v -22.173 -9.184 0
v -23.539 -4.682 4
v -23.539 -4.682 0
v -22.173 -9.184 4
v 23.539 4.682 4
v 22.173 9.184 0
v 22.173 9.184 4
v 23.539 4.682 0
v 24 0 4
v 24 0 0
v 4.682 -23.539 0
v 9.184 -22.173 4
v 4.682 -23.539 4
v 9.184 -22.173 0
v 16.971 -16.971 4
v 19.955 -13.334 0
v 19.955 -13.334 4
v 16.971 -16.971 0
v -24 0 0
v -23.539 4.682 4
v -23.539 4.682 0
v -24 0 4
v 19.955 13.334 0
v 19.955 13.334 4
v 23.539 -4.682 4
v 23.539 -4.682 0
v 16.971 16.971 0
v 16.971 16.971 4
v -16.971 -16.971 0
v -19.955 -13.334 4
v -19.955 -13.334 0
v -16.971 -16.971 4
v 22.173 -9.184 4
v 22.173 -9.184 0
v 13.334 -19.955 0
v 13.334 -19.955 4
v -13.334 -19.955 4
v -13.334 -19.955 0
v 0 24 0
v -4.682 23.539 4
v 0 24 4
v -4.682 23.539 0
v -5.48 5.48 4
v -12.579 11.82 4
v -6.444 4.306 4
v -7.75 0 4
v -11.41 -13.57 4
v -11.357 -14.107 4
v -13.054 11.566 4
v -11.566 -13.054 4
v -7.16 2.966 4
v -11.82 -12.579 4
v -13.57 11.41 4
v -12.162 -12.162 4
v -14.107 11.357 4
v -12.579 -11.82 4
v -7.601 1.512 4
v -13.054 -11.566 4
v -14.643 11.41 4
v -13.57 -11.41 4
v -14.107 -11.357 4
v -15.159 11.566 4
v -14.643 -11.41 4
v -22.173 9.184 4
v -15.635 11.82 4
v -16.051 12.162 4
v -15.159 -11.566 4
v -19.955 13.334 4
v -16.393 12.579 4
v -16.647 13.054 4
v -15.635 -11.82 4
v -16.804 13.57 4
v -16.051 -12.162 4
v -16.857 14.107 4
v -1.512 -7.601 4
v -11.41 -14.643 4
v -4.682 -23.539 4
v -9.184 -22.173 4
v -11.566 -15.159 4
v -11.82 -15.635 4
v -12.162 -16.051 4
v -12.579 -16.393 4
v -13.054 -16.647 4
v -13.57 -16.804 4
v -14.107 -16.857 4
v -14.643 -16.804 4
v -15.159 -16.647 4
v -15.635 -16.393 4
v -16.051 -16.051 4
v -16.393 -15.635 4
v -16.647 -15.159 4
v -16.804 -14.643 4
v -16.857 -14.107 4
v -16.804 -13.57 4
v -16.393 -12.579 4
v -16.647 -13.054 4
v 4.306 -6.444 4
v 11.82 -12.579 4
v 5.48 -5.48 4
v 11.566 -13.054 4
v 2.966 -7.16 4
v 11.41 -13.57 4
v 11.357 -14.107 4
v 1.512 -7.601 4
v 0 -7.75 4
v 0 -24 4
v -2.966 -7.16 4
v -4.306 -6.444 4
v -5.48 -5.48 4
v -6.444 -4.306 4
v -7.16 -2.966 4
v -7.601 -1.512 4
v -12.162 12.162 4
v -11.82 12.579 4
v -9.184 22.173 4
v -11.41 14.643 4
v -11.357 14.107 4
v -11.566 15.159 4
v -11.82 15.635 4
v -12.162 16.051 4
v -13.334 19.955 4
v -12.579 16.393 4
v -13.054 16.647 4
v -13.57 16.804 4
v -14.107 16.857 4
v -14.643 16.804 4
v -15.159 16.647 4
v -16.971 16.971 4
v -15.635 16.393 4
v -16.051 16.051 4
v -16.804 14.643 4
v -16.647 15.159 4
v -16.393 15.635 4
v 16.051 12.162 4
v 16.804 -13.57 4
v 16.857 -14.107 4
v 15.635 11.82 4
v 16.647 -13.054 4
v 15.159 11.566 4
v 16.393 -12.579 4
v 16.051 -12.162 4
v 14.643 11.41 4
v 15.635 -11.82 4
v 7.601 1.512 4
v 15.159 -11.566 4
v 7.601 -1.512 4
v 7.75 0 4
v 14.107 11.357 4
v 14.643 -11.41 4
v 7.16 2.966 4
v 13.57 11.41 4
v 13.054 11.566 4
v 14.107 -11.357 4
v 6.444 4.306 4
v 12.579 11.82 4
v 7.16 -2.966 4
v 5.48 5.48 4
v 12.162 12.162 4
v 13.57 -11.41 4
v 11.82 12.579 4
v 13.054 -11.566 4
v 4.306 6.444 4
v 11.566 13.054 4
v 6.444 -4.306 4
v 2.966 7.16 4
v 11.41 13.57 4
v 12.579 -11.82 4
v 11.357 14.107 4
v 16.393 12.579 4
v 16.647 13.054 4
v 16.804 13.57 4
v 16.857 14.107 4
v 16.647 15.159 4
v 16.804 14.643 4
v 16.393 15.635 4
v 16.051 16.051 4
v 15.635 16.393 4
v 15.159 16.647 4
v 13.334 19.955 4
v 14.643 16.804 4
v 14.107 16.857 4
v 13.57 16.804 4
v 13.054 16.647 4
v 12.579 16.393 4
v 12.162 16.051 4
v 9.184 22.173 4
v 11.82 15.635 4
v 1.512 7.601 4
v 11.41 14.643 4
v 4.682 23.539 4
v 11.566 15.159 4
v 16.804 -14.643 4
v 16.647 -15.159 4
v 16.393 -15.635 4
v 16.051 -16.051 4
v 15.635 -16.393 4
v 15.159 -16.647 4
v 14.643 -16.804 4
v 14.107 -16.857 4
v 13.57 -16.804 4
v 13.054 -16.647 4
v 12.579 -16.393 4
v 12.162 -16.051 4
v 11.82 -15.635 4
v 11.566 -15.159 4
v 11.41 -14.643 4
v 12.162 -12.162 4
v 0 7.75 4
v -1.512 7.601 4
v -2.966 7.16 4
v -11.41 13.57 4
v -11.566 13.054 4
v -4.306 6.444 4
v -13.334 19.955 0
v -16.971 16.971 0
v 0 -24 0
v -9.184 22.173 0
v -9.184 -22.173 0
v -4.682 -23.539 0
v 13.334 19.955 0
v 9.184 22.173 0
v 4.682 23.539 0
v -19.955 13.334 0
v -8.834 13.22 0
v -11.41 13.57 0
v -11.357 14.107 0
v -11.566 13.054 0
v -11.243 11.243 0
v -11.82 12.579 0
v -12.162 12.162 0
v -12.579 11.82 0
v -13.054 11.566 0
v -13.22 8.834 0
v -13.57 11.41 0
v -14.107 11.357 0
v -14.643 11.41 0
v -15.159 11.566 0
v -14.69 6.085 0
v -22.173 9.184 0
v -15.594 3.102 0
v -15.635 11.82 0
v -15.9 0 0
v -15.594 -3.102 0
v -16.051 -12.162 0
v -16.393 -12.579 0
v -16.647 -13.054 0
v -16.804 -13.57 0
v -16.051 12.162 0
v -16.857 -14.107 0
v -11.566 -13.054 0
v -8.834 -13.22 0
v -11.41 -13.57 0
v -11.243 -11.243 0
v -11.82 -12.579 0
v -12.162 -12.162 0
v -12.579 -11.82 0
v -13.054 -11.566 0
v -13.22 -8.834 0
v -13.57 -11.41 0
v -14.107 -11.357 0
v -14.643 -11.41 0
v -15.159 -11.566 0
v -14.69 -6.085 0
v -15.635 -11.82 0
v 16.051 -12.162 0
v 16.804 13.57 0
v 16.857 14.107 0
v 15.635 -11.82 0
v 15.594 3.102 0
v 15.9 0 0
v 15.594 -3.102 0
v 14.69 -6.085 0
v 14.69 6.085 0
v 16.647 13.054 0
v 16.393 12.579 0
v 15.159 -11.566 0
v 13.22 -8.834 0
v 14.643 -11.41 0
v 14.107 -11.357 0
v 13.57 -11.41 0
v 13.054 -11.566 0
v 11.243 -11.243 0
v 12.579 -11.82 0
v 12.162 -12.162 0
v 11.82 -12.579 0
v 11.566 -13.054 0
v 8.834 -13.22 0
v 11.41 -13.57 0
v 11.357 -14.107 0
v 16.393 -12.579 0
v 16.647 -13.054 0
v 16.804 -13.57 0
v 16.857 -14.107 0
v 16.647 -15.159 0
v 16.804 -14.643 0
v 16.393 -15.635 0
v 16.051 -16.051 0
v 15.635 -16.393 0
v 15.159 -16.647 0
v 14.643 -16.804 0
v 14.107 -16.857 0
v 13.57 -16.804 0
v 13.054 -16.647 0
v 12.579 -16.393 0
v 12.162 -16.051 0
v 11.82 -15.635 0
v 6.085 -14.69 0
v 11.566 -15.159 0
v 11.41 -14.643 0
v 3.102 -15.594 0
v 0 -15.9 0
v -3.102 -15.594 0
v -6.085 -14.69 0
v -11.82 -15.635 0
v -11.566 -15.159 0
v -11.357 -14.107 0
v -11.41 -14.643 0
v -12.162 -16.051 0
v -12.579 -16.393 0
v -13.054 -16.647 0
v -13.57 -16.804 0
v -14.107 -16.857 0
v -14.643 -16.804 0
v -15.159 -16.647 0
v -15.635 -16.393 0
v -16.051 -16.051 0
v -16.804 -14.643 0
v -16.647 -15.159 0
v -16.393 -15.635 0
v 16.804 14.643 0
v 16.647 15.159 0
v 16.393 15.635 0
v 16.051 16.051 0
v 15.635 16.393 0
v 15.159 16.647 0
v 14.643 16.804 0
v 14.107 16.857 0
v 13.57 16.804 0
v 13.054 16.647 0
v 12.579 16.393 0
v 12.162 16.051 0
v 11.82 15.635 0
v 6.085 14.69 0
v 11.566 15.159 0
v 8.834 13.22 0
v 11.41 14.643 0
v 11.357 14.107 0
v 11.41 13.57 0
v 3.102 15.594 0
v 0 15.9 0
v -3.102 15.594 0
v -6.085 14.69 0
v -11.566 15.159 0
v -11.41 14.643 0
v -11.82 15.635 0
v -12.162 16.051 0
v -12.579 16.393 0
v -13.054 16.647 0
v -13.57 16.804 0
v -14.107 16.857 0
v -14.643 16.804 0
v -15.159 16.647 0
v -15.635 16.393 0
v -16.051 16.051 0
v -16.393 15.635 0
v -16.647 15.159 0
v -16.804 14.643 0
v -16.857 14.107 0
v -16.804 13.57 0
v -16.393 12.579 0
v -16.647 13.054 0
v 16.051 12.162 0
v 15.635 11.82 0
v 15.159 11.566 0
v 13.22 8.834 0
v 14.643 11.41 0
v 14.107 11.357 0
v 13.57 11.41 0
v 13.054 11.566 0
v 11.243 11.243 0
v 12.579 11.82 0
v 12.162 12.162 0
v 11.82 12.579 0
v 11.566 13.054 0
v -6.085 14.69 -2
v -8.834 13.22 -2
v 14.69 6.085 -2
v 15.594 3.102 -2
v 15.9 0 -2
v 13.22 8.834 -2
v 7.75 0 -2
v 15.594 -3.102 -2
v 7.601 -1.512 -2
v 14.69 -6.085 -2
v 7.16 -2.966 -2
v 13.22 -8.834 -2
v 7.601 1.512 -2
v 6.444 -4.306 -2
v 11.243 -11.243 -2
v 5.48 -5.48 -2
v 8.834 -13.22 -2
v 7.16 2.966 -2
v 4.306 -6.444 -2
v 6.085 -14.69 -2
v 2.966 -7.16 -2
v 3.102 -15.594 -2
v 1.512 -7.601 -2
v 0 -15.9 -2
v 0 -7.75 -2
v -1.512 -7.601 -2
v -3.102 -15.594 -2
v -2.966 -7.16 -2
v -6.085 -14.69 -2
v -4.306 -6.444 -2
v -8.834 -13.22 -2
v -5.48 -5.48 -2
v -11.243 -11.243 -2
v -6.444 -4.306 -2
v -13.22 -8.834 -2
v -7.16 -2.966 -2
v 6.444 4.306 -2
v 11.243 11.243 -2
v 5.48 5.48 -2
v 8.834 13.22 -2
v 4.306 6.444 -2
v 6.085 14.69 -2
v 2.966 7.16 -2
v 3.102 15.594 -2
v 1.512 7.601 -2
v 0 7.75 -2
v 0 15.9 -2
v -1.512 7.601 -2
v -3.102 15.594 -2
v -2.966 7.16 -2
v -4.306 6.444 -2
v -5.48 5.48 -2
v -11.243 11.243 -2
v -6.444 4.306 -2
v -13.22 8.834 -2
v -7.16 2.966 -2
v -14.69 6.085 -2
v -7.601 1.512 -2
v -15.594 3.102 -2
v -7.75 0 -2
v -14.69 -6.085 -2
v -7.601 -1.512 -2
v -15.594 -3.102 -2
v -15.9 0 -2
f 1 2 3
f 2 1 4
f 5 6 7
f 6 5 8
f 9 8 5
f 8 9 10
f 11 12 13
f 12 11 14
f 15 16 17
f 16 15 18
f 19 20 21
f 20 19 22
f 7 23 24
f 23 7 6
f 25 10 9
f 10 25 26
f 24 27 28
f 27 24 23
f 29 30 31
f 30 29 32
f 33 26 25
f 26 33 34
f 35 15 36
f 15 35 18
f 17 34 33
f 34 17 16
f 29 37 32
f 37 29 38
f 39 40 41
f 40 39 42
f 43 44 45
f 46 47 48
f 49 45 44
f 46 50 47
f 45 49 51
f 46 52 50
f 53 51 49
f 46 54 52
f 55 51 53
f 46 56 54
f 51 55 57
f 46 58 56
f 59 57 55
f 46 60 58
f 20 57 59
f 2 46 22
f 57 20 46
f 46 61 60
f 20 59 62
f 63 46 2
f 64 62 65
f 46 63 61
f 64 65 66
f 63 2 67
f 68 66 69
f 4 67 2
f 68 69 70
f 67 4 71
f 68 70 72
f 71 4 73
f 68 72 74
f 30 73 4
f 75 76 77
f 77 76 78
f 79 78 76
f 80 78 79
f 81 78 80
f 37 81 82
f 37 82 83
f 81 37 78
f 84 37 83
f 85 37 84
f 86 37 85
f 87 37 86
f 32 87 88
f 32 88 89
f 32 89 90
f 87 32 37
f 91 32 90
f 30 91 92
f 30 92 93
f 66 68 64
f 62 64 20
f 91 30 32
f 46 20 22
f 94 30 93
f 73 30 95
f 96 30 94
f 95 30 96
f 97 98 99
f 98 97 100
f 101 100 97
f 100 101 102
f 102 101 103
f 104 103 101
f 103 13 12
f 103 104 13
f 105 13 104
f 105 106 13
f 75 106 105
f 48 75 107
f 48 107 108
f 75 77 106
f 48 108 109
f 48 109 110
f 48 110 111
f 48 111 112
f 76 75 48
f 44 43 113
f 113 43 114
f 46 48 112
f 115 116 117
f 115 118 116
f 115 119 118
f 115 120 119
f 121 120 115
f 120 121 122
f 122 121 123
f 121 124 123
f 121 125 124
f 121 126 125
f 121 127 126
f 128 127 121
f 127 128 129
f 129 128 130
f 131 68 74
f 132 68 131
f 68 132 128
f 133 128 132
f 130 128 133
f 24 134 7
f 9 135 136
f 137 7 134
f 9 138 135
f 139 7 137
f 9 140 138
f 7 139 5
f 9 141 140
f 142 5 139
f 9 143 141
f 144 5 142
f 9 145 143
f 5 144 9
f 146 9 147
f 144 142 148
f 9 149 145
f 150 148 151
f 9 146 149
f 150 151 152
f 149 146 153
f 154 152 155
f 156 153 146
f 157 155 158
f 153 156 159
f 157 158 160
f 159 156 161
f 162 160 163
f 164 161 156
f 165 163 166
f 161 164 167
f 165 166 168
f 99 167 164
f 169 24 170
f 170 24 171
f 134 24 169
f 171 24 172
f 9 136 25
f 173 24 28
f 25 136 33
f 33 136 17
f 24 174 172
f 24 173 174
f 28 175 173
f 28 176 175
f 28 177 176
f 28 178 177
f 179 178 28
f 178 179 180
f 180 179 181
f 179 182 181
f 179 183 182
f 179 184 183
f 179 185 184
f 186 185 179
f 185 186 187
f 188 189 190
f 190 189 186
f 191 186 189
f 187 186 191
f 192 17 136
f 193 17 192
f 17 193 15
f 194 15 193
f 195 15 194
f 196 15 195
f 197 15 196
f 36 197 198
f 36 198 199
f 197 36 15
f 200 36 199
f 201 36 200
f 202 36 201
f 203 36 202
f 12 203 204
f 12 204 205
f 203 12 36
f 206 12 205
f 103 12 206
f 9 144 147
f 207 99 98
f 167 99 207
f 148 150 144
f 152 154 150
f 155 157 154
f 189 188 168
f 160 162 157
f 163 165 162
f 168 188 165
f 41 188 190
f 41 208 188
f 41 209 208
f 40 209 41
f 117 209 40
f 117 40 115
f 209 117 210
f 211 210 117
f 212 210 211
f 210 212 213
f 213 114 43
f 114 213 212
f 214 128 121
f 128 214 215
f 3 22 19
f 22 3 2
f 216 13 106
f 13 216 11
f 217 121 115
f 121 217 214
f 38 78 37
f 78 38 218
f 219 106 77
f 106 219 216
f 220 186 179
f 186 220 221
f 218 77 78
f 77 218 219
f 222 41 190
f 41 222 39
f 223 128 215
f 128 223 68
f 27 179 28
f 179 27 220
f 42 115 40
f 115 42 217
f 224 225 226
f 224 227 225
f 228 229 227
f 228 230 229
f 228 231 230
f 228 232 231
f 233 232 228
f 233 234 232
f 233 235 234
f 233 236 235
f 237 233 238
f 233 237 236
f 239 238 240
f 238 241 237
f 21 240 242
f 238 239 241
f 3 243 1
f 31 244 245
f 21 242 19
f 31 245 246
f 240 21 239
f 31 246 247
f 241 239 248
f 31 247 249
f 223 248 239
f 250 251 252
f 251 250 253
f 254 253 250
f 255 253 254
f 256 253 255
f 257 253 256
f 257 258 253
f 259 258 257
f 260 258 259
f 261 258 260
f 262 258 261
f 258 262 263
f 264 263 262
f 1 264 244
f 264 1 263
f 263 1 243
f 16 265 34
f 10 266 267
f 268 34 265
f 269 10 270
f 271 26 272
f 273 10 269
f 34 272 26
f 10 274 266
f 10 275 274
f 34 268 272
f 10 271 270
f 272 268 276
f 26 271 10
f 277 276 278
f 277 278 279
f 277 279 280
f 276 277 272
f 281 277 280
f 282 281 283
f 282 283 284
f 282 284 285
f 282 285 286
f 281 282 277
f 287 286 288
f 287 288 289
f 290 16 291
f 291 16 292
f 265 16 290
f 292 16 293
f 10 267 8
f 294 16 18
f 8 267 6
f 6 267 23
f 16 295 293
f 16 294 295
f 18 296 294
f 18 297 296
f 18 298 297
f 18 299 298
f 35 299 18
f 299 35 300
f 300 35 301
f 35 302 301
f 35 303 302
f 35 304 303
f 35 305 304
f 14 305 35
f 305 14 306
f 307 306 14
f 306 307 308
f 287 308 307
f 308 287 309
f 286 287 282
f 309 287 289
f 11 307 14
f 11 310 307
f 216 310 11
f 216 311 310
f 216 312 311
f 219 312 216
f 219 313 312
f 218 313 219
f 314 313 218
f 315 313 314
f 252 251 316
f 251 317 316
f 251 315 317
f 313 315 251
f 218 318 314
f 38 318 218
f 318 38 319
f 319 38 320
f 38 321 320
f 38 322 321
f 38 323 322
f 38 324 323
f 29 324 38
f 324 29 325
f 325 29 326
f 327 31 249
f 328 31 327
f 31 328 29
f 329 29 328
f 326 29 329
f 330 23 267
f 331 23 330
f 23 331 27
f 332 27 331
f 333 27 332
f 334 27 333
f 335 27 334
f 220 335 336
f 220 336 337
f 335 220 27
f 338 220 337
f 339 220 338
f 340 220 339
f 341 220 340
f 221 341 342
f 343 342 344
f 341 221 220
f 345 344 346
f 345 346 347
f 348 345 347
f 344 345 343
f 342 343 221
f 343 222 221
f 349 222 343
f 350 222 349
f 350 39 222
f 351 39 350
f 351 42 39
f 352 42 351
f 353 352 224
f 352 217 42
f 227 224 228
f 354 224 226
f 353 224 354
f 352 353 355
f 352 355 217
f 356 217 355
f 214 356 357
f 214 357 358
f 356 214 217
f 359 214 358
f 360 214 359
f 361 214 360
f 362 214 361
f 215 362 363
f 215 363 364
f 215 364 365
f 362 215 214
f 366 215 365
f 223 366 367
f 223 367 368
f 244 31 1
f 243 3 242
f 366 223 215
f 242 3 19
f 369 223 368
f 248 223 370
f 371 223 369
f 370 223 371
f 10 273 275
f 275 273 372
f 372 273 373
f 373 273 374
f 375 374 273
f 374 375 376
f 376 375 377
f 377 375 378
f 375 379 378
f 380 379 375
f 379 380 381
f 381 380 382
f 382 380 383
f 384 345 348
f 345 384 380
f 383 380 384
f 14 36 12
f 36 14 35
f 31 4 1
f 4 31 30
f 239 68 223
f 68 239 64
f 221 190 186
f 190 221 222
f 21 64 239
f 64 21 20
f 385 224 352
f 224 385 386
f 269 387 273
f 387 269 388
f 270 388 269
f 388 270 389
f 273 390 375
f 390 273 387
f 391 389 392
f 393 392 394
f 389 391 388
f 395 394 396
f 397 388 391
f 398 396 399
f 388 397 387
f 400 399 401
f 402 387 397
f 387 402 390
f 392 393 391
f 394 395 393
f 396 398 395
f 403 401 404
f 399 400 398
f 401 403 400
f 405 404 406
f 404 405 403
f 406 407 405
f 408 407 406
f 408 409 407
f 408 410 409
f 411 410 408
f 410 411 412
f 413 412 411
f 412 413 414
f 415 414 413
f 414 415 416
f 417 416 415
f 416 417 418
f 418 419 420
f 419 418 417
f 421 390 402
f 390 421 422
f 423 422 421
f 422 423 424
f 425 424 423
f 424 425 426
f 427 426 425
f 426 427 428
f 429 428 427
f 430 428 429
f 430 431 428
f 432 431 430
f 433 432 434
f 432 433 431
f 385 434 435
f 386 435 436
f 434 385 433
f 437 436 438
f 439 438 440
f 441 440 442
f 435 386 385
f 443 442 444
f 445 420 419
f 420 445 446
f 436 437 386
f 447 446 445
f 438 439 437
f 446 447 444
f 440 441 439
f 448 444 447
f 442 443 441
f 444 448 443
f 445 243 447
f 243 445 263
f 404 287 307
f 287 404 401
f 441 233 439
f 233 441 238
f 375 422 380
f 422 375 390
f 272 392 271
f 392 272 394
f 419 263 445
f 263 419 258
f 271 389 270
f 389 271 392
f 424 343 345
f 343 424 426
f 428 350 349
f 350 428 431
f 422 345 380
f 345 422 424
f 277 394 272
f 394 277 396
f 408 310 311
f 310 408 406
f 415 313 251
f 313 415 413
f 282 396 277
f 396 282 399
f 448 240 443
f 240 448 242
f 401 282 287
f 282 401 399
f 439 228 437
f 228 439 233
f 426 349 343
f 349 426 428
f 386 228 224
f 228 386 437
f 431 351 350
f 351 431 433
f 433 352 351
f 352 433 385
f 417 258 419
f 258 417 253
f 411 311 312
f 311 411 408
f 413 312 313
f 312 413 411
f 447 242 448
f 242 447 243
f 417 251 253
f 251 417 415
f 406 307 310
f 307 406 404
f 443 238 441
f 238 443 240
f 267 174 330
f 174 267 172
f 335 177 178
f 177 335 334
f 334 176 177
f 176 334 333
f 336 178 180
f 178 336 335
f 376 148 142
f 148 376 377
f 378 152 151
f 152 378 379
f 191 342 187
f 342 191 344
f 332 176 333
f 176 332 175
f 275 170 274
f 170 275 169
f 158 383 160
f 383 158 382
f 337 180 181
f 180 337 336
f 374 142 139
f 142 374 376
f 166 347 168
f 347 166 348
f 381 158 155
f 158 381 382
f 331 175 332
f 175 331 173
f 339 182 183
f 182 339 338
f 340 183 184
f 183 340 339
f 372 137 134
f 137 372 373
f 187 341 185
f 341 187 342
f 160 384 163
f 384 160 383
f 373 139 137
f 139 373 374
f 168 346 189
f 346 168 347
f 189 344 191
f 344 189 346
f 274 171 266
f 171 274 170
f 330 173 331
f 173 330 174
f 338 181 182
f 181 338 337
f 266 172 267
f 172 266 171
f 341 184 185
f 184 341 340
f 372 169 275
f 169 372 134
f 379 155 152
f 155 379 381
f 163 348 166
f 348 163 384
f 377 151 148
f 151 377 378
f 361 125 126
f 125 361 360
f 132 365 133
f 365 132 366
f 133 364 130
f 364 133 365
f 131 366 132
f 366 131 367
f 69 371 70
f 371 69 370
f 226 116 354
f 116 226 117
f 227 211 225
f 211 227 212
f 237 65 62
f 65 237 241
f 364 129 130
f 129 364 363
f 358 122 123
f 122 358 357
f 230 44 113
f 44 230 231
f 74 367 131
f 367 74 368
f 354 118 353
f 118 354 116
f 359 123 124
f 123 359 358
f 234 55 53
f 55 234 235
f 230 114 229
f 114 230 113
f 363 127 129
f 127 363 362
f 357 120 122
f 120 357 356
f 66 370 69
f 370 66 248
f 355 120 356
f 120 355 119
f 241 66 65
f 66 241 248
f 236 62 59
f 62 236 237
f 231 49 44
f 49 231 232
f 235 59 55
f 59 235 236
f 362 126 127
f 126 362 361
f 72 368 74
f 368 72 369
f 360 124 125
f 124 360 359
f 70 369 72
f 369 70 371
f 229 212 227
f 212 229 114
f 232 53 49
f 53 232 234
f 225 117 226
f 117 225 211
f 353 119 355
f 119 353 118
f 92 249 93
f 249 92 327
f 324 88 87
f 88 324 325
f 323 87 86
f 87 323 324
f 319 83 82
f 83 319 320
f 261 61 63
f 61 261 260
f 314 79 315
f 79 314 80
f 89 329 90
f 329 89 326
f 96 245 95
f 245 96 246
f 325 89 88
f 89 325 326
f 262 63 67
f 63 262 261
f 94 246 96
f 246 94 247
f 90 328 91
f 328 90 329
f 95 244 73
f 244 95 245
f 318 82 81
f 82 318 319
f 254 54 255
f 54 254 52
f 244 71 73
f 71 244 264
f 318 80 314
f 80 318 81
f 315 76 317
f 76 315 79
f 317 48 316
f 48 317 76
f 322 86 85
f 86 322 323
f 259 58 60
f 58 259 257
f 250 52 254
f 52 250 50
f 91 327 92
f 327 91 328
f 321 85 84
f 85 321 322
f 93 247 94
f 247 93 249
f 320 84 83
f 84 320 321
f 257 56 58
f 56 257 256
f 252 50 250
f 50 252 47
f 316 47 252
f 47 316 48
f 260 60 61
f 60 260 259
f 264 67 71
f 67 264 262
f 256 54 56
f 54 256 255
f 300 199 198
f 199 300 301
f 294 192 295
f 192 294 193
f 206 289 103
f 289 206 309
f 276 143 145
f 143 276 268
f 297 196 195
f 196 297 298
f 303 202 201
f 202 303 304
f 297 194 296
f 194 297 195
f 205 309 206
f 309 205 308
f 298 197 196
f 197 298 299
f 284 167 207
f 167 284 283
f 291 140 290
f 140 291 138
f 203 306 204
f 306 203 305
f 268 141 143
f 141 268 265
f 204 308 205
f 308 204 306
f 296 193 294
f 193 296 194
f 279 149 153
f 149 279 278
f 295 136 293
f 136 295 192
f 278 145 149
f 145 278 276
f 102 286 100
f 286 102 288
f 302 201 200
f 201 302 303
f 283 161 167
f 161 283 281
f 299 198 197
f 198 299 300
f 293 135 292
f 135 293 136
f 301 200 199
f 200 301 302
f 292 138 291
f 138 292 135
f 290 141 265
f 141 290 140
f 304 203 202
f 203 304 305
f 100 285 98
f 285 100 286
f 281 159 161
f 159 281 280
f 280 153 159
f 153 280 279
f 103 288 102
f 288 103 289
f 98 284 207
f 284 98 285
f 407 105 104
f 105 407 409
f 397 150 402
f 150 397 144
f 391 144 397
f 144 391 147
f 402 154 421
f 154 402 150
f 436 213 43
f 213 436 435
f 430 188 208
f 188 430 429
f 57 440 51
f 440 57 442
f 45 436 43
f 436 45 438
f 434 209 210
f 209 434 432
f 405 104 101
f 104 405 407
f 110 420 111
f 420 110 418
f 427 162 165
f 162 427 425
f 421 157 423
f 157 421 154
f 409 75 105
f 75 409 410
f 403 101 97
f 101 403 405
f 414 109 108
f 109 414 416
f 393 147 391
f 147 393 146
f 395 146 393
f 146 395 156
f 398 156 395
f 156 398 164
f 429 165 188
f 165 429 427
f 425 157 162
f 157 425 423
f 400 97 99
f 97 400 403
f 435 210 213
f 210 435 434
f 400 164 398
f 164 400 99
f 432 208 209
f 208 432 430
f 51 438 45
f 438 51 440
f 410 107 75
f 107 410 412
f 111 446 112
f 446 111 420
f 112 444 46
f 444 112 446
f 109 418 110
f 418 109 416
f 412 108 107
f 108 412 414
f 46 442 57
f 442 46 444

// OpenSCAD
$fn = 32;

// ----------------------------------------------------------------------
// Retaining cap: 6002 cover, 48 mm, spigot 31.8 mm
// ----------------------------------------------------------------------

// --- parameters (mm) ---
plate_d = 48;             // cover diameter
plate_t = 4;              // cover thickness
boss_d = 31.8;            // spigot that enters the housing
boss_h = 2;               // spigot height
shaft_d = 15.5;           // shaft opening
bolt_d = 5.5;             // bolt clearance
bolt_r = 19.95;           // bolt circle radius

module cover() {
  cylinder(h = plate_t, d = plate_d);
}

module spigot() {
  /* sunk 1 mm into the cover; the spigot sets the overall height */
  translate([0, 0, -boss_h]) cylinder(h = boss_h + 1, d = boss_d);
}

difference() {
  union() {
    cover();
    spigot();
  }
  for (i = [0 : 3]) rotate([0, 0, 45 + i * 90]) translate([bolt_r, 0, -boss_h - 1])
    cylinder(h = boss_h + plate_t + 2, d = bolt_d);
  translate([0, 0, -boss_h - 1]) cylinder(h = boss_h + plate_t + 2, d = shaft_d);
}
